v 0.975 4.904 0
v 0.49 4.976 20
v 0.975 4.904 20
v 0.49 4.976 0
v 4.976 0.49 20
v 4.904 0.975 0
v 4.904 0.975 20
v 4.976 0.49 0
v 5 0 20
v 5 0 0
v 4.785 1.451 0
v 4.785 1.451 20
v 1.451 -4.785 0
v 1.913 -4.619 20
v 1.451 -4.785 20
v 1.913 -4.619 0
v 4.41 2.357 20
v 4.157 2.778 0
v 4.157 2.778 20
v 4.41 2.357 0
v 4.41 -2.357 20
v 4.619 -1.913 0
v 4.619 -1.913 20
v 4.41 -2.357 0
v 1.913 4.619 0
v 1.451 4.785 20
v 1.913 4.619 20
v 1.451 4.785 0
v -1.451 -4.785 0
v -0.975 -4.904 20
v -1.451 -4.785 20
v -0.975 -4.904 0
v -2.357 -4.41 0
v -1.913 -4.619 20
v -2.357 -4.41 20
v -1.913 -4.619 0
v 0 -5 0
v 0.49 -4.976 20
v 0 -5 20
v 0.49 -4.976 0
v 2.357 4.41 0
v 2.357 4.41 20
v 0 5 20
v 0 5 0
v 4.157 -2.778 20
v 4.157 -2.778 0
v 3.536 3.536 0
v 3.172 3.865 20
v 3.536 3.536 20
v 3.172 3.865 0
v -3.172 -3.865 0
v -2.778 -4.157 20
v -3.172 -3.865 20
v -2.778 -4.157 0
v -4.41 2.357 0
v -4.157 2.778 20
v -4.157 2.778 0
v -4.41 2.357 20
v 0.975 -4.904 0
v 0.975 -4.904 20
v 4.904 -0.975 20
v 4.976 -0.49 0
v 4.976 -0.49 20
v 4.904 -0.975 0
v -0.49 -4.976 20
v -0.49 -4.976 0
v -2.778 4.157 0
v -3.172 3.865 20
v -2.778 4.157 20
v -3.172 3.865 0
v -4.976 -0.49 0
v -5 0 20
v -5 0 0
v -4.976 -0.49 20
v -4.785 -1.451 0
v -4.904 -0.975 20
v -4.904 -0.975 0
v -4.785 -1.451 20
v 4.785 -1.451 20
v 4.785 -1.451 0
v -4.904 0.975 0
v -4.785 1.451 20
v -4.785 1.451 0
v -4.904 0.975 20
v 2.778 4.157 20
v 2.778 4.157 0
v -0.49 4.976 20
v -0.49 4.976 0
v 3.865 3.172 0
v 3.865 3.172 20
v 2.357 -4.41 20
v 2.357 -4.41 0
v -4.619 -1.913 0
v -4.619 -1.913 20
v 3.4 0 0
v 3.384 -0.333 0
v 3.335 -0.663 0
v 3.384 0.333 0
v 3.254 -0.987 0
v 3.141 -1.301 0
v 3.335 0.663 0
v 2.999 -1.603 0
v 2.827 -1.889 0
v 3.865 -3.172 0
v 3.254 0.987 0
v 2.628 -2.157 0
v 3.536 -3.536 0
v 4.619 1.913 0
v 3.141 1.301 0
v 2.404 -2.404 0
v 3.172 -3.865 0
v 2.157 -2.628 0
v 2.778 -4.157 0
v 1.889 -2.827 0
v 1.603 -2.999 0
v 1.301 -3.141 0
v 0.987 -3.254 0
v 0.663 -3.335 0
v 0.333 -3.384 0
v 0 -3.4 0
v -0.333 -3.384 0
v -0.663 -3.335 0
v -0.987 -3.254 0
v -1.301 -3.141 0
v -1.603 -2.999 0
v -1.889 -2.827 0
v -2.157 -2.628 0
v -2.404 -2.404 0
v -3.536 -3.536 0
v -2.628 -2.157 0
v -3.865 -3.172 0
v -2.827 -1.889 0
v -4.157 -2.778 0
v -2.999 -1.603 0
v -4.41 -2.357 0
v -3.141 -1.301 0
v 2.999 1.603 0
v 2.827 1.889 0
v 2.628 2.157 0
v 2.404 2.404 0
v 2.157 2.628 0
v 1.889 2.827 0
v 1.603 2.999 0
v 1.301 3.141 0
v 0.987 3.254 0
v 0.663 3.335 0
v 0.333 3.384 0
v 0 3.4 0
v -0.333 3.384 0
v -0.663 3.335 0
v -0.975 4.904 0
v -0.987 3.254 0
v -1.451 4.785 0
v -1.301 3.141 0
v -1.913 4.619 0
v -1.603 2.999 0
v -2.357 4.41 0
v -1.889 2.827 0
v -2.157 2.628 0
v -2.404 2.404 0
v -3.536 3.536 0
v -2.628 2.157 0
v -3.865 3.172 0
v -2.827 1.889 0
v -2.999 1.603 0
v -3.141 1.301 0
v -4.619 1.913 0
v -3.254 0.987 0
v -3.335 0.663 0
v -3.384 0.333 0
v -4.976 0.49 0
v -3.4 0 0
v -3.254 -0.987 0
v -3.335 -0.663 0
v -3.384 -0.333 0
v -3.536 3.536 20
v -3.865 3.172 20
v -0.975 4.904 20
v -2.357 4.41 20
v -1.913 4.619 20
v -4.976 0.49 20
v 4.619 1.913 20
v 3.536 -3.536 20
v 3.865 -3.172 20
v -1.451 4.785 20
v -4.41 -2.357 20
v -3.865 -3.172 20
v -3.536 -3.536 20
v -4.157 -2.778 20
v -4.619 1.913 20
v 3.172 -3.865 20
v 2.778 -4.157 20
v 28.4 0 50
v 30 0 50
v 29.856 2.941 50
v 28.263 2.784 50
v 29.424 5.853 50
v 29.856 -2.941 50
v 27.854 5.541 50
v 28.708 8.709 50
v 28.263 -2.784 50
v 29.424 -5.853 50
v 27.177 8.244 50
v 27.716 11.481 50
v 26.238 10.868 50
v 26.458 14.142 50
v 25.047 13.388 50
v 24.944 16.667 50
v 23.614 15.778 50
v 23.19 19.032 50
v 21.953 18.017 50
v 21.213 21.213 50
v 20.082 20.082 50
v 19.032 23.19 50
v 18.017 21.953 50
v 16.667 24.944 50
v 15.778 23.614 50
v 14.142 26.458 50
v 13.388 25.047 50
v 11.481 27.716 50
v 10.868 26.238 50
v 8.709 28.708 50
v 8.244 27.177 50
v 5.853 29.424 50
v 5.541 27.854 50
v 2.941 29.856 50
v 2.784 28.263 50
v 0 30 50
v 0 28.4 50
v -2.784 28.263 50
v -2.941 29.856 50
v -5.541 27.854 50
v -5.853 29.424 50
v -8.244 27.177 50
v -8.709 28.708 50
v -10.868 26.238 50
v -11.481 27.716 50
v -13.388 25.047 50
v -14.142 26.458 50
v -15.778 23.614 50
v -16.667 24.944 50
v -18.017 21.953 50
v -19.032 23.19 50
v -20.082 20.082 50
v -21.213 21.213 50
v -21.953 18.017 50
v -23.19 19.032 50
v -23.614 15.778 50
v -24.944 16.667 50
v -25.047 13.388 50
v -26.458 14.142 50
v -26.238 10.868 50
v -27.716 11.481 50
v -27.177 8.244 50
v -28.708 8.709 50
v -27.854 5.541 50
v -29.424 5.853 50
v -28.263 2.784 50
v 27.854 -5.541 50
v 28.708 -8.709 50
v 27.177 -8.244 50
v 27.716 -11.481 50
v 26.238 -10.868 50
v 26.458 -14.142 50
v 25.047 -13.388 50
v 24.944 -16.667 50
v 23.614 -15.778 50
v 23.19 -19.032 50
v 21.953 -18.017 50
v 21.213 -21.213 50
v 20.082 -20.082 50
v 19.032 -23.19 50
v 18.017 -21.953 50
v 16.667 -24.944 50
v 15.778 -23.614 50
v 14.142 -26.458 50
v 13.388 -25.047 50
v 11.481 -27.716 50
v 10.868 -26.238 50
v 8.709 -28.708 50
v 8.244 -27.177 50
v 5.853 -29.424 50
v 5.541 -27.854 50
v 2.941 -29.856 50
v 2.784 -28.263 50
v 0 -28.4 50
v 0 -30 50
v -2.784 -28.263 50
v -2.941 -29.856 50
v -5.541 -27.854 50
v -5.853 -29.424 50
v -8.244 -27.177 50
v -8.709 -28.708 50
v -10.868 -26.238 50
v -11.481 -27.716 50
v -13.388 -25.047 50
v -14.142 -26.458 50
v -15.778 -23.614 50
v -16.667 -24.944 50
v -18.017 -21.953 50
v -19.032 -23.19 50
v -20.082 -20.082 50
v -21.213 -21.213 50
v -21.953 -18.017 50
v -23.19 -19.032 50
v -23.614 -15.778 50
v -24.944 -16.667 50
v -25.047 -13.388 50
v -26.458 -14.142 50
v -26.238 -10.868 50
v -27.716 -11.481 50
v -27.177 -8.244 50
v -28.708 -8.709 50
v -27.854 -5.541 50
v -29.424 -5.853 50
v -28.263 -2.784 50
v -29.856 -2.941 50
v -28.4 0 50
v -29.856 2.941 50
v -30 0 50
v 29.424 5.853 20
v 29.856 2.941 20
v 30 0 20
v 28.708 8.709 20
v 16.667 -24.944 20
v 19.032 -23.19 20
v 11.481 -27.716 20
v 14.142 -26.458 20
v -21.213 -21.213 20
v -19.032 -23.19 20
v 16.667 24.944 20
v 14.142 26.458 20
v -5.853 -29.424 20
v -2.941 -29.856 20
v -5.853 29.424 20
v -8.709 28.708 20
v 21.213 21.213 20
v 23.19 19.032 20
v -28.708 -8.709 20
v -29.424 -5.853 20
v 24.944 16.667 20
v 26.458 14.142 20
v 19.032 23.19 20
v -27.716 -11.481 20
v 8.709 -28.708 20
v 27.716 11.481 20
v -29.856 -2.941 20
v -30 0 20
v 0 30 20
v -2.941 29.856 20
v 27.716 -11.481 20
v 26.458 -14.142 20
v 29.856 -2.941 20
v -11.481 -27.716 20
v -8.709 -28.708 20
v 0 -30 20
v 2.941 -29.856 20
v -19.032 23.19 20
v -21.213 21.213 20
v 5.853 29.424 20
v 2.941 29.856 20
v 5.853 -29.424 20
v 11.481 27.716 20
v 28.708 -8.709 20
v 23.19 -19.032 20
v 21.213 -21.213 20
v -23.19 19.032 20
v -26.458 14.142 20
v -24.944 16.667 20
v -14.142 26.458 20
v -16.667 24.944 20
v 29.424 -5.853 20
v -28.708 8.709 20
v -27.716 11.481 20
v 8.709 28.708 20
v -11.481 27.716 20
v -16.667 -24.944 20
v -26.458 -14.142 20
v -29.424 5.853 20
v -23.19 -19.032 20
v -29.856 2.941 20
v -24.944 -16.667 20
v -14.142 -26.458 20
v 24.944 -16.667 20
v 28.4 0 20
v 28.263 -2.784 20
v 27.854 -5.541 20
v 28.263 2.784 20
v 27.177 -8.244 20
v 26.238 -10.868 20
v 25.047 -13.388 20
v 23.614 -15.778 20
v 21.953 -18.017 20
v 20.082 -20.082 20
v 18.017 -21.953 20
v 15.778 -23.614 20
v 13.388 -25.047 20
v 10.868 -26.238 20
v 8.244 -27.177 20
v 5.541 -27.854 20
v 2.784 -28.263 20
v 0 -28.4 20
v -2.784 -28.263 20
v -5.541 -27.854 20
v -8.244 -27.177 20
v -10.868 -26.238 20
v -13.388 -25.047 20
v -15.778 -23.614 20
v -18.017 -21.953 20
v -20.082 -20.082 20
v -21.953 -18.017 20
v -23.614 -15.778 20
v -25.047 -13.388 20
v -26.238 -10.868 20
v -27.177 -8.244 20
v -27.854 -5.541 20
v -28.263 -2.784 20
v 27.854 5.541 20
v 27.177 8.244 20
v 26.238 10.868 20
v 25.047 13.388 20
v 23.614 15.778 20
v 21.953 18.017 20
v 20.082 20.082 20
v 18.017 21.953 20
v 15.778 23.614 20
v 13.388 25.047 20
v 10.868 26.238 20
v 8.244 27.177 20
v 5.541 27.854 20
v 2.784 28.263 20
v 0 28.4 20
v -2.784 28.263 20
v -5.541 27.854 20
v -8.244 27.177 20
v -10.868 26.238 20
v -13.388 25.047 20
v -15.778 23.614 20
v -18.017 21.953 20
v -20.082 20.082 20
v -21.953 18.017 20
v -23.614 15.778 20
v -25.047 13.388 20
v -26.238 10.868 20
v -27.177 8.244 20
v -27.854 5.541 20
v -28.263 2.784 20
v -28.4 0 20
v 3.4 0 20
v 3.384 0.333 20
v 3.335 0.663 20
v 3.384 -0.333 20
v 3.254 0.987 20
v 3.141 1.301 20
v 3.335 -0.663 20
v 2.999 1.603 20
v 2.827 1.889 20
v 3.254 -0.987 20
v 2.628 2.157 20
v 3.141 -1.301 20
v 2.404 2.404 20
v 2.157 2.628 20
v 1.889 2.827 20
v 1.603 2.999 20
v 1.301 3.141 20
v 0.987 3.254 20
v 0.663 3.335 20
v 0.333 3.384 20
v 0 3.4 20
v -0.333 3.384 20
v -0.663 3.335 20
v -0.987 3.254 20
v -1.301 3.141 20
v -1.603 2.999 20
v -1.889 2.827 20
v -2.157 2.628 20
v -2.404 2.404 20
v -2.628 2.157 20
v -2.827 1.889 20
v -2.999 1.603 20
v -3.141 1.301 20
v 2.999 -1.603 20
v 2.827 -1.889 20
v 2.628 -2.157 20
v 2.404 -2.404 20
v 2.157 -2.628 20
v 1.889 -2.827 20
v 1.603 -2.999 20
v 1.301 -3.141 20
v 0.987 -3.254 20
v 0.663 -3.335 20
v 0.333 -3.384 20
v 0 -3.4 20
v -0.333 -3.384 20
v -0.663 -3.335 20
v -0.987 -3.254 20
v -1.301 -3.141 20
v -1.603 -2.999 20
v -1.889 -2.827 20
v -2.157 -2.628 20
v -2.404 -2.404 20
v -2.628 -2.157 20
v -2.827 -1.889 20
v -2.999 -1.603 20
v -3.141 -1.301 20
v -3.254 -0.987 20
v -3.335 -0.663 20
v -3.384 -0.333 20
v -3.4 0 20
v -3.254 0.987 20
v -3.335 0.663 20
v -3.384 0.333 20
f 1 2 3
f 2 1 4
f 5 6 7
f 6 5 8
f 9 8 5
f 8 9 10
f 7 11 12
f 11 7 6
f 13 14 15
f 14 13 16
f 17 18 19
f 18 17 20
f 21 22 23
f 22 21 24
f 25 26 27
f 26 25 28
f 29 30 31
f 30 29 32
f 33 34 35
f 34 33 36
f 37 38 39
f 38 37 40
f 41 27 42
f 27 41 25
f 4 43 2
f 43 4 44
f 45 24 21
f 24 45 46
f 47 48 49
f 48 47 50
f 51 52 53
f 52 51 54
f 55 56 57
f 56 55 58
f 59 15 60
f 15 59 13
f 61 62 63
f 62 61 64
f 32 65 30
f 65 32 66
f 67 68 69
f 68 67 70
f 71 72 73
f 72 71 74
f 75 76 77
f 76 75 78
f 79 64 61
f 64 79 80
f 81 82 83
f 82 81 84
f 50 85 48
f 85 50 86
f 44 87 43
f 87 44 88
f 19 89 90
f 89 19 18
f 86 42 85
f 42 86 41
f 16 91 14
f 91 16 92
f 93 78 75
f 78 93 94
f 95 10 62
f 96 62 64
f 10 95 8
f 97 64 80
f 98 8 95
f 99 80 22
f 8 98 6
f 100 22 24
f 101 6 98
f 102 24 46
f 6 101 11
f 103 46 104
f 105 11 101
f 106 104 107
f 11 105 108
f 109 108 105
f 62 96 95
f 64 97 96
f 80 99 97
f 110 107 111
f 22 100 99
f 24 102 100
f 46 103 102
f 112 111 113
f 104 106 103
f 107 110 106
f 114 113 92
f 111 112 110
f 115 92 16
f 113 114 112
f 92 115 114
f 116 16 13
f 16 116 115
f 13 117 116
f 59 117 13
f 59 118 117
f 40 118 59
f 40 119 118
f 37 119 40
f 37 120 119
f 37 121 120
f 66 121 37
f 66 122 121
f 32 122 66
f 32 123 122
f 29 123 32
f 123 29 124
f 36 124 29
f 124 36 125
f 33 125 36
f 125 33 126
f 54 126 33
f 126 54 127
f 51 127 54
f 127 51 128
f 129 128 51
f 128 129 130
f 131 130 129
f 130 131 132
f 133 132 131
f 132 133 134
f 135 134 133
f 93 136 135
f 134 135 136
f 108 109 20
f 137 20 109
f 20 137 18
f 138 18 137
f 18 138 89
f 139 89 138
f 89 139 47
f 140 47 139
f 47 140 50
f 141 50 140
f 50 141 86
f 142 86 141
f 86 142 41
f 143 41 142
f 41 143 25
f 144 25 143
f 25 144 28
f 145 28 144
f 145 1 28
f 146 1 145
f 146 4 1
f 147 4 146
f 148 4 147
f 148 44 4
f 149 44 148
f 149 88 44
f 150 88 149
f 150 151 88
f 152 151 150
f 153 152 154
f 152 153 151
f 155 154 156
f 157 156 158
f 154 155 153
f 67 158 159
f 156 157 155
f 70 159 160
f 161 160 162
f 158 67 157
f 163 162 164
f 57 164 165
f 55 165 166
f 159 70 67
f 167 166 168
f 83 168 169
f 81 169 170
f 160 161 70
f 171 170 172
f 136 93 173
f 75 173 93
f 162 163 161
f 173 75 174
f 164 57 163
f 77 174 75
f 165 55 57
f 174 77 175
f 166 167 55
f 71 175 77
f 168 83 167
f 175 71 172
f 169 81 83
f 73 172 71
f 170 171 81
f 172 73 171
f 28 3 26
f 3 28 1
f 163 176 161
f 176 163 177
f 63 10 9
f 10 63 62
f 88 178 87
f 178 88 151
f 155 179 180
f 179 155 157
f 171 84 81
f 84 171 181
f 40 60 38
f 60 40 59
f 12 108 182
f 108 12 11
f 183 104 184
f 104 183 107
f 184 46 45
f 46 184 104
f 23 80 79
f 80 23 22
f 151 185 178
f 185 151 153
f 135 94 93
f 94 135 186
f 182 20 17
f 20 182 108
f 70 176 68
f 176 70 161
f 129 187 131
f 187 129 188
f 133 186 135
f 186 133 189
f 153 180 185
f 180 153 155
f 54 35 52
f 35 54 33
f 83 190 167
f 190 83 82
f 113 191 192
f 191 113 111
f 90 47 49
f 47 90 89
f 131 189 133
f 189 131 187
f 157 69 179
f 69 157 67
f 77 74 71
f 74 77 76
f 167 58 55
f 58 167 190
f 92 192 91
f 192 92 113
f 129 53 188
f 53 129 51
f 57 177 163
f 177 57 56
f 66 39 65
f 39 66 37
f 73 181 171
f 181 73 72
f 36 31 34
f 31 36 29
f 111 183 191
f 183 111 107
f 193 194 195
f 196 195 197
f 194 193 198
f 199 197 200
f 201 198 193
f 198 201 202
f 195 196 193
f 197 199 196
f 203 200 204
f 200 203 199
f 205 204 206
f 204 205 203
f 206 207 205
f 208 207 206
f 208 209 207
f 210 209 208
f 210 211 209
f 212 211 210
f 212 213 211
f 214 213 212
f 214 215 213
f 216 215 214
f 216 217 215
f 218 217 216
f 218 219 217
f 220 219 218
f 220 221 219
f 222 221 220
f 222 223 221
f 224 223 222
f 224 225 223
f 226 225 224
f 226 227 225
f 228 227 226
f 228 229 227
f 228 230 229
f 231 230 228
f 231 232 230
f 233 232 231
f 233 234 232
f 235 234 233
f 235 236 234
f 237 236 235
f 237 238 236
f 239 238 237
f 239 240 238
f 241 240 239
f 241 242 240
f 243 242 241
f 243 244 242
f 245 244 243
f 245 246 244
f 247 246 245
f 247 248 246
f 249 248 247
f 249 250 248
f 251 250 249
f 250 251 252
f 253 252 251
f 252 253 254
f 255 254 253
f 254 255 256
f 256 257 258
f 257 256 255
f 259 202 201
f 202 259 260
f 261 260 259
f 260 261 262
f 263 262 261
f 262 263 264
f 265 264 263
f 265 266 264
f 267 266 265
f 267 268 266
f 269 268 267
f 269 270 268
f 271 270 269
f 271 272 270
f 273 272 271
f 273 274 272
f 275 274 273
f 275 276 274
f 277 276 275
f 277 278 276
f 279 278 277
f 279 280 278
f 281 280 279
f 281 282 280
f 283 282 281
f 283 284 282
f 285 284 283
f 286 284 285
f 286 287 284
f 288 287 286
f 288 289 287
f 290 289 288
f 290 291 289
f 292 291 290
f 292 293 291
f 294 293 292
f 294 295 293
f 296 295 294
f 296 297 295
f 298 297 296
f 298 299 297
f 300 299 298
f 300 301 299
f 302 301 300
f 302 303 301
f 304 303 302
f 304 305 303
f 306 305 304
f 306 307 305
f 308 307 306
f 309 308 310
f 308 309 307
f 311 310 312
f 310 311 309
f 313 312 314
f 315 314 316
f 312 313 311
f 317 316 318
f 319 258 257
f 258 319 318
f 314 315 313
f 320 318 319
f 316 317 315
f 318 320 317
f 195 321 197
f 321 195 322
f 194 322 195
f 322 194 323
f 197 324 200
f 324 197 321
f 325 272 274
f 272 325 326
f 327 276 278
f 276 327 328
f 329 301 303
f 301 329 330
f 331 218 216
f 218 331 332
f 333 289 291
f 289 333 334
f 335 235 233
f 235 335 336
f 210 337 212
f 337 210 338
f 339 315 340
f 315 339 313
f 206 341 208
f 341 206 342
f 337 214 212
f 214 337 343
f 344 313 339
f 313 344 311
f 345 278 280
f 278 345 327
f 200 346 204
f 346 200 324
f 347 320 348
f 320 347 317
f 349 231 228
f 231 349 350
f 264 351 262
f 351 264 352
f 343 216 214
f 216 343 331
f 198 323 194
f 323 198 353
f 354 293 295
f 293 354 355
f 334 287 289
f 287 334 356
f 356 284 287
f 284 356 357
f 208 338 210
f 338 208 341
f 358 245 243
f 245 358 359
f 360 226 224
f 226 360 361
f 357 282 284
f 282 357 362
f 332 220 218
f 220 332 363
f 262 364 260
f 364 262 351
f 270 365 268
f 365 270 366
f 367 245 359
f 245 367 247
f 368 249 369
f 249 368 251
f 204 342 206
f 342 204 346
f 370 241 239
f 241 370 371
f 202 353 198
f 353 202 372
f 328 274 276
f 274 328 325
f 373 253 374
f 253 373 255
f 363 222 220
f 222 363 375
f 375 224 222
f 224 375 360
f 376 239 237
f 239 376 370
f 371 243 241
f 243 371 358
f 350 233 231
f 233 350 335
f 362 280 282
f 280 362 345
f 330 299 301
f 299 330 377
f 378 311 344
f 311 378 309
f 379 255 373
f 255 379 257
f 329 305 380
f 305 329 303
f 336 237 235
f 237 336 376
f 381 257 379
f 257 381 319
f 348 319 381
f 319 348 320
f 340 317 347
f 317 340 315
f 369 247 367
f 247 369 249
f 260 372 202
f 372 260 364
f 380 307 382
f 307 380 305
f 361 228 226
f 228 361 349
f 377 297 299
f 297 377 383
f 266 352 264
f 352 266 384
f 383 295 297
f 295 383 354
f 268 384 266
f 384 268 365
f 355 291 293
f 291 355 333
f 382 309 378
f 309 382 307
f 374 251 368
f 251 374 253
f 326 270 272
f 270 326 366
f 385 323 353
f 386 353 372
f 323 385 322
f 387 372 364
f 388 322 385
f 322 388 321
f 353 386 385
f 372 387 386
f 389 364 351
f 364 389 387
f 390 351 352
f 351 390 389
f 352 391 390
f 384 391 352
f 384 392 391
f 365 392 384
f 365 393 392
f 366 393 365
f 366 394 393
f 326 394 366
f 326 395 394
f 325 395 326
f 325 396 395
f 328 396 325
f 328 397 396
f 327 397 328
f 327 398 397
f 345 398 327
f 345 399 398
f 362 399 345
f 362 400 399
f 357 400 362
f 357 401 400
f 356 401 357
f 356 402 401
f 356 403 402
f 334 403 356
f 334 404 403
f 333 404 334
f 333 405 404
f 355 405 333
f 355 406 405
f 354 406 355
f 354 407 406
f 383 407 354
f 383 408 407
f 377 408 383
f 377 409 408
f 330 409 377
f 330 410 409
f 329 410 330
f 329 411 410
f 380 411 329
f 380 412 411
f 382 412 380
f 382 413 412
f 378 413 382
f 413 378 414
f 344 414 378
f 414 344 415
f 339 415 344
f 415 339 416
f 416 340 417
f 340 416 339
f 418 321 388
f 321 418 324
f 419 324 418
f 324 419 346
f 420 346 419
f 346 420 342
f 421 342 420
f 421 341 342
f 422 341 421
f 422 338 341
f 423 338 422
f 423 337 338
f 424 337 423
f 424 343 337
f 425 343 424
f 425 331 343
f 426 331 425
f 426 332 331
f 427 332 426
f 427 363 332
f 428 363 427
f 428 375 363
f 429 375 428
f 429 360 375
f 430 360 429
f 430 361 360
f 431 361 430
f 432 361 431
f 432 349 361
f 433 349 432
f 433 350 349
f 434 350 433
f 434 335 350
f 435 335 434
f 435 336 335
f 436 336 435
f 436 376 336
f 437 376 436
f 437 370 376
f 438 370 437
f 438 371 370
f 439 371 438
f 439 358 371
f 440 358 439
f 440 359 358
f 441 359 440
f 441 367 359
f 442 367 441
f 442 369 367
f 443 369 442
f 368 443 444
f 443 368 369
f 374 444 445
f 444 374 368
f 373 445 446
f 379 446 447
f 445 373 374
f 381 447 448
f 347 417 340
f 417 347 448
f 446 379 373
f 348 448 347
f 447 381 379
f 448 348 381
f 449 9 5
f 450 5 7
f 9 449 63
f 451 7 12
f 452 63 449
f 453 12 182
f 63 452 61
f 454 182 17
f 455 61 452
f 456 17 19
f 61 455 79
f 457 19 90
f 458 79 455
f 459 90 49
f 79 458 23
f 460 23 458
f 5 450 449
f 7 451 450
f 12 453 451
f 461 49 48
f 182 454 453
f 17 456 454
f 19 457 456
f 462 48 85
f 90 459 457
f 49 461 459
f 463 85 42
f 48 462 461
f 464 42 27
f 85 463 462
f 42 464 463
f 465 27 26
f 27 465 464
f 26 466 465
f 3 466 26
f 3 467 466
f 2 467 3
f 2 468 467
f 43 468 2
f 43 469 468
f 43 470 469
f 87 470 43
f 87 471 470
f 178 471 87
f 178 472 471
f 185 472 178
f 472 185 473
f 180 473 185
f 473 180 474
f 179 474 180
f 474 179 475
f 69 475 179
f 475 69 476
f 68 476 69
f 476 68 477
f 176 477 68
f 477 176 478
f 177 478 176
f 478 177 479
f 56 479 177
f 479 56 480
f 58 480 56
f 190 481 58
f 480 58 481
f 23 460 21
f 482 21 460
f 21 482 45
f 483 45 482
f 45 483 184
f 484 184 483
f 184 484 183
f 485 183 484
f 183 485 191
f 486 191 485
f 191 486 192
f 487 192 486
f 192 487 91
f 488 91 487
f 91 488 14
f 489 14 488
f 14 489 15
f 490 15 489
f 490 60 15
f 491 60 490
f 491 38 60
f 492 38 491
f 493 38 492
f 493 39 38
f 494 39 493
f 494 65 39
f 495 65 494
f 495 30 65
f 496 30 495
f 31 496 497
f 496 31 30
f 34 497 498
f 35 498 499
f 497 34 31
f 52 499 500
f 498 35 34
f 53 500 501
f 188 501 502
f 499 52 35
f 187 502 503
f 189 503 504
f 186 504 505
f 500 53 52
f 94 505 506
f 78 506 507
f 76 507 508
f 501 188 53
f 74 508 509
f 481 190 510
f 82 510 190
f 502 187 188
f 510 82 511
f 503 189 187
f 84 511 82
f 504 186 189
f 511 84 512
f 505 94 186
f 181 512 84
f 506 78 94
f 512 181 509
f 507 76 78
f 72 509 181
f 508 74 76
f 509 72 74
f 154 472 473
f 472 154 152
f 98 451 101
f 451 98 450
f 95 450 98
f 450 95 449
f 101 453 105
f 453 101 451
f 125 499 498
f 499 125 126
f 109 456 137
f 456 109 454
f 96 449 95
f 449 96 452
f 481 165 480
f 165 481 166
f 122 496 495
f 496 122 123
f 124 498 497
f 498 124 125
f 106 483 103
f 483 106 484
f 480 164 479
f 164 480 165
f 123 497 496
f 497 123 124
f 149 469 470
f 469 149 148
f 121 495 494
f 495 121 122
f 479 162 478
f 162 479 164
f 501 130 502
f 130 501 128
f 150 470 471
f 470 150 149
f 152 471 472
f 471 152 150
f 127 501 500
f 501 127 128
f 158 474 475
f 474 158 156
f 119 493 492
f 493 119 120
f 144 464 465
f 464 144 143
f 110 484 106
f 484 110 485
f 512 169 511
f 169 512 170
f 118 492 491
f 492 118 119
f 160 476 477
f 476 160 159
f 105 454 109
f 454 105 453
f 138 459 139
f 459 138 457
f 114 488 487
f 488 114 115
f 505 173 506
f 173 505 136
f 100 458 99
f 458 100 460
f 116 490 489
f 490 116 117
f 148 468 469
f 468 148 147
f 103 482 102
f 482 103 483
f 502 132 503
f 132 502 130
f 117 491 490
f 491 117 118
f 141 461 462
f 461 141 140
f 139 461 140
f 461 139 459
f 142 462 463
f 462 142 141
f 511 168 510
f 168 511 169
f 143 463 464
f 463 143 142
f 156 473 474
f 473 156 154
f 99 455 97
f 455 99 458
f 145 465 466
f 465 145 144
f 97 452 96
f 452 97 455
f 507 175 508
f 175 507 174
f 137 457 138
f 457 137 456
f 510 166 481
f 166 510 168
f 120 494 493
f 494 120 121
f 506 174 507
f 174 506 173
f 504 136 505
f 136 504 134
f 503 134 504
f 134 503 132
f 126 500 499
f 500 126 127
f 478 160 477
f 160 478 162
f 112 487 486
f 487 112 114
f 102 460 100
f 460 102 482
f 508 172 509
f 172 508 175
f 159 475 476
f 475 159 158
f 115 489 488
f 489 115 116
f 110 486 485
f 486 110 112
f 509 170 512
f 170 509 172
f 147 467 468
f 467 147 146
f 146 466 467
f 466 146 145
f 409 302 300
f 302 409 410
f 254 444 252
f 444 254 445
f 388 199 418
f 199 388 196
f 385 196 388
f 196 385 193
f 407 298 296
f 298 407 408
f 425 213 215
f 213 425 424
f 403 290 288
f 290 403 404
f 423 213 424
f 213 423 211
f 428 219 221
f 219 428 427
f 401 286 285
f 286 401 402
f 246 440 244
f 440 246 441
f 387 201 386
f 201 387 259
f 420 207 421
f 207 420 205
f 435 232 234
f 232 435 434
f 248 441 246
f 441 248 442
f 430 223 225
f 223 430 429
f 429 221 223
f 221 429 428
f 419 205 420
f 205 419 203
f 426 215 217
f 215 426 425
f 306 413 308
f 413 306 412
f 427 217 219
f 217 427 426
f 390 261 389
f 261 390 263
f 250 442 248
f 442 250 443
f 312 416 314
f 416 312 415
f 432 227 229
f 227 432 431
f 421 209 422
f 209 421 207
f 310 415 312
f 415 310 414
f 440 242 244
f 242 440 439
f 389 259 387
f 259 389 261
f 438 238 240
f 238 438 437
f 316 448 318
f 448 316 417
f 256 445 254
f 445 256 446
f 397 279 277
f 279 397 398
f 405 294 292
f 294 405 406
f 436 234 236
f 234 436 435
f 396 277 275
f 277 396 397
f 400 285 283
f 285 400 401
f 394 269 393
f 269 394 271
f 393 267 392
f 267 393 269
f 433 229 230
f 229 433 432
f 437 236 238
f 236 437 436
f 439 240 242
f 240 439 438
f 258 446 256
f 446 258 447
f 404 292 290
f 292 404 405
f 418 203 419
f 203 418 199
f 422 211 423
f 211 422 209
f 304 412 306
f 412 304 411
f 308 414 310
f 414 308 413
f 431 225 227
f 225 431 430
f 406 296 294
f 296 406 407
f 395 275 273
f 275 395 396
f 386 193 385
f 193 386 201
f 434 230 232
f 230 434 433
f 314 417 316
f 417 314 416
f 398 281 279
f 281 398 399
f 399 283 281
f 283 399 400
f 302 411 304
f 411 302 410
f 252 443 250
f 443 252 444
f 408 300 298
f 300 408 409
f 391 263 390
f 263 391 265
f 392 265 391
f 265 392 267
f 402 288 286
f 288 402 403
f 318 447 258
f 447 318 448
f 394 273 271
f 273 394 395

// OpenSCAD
// Funnel - a spout (tube) sitting below a conical section, open at both ends for fluid flow.
// NOVEL general part for a lab or control application.
//

spout_d = 10;
spout_z = 20;
cone_d  = 60;
rim_z   = 50;
wall    = 1.6;

$fn = 64;

ib = spout_d - 2 * wall;   // spout bore
ic = cone_d - 2 * wall;    // cone inner diameter at the join

difference() {
    union() {
        cylinder(h = spout_z, d = spout_d);                 // spout
        translate([0, 0, spout_z]) cylinder(h = rim_z - spout_z, d = spout_d, $fn = 64);
        translate([0, 0, spout_z]) cylinder(h = rim_z - spout_z, d = cone_d, $fn = 64);
    }
    translate([0, 0, -1]) cylinder(h = spout_z + 2, d = ib);                     // bore through spout
    translate([0, 0, spout_z]) cylinder(h = rim_z - spout_z + 1, d = ic);       // inner cone surface
}
